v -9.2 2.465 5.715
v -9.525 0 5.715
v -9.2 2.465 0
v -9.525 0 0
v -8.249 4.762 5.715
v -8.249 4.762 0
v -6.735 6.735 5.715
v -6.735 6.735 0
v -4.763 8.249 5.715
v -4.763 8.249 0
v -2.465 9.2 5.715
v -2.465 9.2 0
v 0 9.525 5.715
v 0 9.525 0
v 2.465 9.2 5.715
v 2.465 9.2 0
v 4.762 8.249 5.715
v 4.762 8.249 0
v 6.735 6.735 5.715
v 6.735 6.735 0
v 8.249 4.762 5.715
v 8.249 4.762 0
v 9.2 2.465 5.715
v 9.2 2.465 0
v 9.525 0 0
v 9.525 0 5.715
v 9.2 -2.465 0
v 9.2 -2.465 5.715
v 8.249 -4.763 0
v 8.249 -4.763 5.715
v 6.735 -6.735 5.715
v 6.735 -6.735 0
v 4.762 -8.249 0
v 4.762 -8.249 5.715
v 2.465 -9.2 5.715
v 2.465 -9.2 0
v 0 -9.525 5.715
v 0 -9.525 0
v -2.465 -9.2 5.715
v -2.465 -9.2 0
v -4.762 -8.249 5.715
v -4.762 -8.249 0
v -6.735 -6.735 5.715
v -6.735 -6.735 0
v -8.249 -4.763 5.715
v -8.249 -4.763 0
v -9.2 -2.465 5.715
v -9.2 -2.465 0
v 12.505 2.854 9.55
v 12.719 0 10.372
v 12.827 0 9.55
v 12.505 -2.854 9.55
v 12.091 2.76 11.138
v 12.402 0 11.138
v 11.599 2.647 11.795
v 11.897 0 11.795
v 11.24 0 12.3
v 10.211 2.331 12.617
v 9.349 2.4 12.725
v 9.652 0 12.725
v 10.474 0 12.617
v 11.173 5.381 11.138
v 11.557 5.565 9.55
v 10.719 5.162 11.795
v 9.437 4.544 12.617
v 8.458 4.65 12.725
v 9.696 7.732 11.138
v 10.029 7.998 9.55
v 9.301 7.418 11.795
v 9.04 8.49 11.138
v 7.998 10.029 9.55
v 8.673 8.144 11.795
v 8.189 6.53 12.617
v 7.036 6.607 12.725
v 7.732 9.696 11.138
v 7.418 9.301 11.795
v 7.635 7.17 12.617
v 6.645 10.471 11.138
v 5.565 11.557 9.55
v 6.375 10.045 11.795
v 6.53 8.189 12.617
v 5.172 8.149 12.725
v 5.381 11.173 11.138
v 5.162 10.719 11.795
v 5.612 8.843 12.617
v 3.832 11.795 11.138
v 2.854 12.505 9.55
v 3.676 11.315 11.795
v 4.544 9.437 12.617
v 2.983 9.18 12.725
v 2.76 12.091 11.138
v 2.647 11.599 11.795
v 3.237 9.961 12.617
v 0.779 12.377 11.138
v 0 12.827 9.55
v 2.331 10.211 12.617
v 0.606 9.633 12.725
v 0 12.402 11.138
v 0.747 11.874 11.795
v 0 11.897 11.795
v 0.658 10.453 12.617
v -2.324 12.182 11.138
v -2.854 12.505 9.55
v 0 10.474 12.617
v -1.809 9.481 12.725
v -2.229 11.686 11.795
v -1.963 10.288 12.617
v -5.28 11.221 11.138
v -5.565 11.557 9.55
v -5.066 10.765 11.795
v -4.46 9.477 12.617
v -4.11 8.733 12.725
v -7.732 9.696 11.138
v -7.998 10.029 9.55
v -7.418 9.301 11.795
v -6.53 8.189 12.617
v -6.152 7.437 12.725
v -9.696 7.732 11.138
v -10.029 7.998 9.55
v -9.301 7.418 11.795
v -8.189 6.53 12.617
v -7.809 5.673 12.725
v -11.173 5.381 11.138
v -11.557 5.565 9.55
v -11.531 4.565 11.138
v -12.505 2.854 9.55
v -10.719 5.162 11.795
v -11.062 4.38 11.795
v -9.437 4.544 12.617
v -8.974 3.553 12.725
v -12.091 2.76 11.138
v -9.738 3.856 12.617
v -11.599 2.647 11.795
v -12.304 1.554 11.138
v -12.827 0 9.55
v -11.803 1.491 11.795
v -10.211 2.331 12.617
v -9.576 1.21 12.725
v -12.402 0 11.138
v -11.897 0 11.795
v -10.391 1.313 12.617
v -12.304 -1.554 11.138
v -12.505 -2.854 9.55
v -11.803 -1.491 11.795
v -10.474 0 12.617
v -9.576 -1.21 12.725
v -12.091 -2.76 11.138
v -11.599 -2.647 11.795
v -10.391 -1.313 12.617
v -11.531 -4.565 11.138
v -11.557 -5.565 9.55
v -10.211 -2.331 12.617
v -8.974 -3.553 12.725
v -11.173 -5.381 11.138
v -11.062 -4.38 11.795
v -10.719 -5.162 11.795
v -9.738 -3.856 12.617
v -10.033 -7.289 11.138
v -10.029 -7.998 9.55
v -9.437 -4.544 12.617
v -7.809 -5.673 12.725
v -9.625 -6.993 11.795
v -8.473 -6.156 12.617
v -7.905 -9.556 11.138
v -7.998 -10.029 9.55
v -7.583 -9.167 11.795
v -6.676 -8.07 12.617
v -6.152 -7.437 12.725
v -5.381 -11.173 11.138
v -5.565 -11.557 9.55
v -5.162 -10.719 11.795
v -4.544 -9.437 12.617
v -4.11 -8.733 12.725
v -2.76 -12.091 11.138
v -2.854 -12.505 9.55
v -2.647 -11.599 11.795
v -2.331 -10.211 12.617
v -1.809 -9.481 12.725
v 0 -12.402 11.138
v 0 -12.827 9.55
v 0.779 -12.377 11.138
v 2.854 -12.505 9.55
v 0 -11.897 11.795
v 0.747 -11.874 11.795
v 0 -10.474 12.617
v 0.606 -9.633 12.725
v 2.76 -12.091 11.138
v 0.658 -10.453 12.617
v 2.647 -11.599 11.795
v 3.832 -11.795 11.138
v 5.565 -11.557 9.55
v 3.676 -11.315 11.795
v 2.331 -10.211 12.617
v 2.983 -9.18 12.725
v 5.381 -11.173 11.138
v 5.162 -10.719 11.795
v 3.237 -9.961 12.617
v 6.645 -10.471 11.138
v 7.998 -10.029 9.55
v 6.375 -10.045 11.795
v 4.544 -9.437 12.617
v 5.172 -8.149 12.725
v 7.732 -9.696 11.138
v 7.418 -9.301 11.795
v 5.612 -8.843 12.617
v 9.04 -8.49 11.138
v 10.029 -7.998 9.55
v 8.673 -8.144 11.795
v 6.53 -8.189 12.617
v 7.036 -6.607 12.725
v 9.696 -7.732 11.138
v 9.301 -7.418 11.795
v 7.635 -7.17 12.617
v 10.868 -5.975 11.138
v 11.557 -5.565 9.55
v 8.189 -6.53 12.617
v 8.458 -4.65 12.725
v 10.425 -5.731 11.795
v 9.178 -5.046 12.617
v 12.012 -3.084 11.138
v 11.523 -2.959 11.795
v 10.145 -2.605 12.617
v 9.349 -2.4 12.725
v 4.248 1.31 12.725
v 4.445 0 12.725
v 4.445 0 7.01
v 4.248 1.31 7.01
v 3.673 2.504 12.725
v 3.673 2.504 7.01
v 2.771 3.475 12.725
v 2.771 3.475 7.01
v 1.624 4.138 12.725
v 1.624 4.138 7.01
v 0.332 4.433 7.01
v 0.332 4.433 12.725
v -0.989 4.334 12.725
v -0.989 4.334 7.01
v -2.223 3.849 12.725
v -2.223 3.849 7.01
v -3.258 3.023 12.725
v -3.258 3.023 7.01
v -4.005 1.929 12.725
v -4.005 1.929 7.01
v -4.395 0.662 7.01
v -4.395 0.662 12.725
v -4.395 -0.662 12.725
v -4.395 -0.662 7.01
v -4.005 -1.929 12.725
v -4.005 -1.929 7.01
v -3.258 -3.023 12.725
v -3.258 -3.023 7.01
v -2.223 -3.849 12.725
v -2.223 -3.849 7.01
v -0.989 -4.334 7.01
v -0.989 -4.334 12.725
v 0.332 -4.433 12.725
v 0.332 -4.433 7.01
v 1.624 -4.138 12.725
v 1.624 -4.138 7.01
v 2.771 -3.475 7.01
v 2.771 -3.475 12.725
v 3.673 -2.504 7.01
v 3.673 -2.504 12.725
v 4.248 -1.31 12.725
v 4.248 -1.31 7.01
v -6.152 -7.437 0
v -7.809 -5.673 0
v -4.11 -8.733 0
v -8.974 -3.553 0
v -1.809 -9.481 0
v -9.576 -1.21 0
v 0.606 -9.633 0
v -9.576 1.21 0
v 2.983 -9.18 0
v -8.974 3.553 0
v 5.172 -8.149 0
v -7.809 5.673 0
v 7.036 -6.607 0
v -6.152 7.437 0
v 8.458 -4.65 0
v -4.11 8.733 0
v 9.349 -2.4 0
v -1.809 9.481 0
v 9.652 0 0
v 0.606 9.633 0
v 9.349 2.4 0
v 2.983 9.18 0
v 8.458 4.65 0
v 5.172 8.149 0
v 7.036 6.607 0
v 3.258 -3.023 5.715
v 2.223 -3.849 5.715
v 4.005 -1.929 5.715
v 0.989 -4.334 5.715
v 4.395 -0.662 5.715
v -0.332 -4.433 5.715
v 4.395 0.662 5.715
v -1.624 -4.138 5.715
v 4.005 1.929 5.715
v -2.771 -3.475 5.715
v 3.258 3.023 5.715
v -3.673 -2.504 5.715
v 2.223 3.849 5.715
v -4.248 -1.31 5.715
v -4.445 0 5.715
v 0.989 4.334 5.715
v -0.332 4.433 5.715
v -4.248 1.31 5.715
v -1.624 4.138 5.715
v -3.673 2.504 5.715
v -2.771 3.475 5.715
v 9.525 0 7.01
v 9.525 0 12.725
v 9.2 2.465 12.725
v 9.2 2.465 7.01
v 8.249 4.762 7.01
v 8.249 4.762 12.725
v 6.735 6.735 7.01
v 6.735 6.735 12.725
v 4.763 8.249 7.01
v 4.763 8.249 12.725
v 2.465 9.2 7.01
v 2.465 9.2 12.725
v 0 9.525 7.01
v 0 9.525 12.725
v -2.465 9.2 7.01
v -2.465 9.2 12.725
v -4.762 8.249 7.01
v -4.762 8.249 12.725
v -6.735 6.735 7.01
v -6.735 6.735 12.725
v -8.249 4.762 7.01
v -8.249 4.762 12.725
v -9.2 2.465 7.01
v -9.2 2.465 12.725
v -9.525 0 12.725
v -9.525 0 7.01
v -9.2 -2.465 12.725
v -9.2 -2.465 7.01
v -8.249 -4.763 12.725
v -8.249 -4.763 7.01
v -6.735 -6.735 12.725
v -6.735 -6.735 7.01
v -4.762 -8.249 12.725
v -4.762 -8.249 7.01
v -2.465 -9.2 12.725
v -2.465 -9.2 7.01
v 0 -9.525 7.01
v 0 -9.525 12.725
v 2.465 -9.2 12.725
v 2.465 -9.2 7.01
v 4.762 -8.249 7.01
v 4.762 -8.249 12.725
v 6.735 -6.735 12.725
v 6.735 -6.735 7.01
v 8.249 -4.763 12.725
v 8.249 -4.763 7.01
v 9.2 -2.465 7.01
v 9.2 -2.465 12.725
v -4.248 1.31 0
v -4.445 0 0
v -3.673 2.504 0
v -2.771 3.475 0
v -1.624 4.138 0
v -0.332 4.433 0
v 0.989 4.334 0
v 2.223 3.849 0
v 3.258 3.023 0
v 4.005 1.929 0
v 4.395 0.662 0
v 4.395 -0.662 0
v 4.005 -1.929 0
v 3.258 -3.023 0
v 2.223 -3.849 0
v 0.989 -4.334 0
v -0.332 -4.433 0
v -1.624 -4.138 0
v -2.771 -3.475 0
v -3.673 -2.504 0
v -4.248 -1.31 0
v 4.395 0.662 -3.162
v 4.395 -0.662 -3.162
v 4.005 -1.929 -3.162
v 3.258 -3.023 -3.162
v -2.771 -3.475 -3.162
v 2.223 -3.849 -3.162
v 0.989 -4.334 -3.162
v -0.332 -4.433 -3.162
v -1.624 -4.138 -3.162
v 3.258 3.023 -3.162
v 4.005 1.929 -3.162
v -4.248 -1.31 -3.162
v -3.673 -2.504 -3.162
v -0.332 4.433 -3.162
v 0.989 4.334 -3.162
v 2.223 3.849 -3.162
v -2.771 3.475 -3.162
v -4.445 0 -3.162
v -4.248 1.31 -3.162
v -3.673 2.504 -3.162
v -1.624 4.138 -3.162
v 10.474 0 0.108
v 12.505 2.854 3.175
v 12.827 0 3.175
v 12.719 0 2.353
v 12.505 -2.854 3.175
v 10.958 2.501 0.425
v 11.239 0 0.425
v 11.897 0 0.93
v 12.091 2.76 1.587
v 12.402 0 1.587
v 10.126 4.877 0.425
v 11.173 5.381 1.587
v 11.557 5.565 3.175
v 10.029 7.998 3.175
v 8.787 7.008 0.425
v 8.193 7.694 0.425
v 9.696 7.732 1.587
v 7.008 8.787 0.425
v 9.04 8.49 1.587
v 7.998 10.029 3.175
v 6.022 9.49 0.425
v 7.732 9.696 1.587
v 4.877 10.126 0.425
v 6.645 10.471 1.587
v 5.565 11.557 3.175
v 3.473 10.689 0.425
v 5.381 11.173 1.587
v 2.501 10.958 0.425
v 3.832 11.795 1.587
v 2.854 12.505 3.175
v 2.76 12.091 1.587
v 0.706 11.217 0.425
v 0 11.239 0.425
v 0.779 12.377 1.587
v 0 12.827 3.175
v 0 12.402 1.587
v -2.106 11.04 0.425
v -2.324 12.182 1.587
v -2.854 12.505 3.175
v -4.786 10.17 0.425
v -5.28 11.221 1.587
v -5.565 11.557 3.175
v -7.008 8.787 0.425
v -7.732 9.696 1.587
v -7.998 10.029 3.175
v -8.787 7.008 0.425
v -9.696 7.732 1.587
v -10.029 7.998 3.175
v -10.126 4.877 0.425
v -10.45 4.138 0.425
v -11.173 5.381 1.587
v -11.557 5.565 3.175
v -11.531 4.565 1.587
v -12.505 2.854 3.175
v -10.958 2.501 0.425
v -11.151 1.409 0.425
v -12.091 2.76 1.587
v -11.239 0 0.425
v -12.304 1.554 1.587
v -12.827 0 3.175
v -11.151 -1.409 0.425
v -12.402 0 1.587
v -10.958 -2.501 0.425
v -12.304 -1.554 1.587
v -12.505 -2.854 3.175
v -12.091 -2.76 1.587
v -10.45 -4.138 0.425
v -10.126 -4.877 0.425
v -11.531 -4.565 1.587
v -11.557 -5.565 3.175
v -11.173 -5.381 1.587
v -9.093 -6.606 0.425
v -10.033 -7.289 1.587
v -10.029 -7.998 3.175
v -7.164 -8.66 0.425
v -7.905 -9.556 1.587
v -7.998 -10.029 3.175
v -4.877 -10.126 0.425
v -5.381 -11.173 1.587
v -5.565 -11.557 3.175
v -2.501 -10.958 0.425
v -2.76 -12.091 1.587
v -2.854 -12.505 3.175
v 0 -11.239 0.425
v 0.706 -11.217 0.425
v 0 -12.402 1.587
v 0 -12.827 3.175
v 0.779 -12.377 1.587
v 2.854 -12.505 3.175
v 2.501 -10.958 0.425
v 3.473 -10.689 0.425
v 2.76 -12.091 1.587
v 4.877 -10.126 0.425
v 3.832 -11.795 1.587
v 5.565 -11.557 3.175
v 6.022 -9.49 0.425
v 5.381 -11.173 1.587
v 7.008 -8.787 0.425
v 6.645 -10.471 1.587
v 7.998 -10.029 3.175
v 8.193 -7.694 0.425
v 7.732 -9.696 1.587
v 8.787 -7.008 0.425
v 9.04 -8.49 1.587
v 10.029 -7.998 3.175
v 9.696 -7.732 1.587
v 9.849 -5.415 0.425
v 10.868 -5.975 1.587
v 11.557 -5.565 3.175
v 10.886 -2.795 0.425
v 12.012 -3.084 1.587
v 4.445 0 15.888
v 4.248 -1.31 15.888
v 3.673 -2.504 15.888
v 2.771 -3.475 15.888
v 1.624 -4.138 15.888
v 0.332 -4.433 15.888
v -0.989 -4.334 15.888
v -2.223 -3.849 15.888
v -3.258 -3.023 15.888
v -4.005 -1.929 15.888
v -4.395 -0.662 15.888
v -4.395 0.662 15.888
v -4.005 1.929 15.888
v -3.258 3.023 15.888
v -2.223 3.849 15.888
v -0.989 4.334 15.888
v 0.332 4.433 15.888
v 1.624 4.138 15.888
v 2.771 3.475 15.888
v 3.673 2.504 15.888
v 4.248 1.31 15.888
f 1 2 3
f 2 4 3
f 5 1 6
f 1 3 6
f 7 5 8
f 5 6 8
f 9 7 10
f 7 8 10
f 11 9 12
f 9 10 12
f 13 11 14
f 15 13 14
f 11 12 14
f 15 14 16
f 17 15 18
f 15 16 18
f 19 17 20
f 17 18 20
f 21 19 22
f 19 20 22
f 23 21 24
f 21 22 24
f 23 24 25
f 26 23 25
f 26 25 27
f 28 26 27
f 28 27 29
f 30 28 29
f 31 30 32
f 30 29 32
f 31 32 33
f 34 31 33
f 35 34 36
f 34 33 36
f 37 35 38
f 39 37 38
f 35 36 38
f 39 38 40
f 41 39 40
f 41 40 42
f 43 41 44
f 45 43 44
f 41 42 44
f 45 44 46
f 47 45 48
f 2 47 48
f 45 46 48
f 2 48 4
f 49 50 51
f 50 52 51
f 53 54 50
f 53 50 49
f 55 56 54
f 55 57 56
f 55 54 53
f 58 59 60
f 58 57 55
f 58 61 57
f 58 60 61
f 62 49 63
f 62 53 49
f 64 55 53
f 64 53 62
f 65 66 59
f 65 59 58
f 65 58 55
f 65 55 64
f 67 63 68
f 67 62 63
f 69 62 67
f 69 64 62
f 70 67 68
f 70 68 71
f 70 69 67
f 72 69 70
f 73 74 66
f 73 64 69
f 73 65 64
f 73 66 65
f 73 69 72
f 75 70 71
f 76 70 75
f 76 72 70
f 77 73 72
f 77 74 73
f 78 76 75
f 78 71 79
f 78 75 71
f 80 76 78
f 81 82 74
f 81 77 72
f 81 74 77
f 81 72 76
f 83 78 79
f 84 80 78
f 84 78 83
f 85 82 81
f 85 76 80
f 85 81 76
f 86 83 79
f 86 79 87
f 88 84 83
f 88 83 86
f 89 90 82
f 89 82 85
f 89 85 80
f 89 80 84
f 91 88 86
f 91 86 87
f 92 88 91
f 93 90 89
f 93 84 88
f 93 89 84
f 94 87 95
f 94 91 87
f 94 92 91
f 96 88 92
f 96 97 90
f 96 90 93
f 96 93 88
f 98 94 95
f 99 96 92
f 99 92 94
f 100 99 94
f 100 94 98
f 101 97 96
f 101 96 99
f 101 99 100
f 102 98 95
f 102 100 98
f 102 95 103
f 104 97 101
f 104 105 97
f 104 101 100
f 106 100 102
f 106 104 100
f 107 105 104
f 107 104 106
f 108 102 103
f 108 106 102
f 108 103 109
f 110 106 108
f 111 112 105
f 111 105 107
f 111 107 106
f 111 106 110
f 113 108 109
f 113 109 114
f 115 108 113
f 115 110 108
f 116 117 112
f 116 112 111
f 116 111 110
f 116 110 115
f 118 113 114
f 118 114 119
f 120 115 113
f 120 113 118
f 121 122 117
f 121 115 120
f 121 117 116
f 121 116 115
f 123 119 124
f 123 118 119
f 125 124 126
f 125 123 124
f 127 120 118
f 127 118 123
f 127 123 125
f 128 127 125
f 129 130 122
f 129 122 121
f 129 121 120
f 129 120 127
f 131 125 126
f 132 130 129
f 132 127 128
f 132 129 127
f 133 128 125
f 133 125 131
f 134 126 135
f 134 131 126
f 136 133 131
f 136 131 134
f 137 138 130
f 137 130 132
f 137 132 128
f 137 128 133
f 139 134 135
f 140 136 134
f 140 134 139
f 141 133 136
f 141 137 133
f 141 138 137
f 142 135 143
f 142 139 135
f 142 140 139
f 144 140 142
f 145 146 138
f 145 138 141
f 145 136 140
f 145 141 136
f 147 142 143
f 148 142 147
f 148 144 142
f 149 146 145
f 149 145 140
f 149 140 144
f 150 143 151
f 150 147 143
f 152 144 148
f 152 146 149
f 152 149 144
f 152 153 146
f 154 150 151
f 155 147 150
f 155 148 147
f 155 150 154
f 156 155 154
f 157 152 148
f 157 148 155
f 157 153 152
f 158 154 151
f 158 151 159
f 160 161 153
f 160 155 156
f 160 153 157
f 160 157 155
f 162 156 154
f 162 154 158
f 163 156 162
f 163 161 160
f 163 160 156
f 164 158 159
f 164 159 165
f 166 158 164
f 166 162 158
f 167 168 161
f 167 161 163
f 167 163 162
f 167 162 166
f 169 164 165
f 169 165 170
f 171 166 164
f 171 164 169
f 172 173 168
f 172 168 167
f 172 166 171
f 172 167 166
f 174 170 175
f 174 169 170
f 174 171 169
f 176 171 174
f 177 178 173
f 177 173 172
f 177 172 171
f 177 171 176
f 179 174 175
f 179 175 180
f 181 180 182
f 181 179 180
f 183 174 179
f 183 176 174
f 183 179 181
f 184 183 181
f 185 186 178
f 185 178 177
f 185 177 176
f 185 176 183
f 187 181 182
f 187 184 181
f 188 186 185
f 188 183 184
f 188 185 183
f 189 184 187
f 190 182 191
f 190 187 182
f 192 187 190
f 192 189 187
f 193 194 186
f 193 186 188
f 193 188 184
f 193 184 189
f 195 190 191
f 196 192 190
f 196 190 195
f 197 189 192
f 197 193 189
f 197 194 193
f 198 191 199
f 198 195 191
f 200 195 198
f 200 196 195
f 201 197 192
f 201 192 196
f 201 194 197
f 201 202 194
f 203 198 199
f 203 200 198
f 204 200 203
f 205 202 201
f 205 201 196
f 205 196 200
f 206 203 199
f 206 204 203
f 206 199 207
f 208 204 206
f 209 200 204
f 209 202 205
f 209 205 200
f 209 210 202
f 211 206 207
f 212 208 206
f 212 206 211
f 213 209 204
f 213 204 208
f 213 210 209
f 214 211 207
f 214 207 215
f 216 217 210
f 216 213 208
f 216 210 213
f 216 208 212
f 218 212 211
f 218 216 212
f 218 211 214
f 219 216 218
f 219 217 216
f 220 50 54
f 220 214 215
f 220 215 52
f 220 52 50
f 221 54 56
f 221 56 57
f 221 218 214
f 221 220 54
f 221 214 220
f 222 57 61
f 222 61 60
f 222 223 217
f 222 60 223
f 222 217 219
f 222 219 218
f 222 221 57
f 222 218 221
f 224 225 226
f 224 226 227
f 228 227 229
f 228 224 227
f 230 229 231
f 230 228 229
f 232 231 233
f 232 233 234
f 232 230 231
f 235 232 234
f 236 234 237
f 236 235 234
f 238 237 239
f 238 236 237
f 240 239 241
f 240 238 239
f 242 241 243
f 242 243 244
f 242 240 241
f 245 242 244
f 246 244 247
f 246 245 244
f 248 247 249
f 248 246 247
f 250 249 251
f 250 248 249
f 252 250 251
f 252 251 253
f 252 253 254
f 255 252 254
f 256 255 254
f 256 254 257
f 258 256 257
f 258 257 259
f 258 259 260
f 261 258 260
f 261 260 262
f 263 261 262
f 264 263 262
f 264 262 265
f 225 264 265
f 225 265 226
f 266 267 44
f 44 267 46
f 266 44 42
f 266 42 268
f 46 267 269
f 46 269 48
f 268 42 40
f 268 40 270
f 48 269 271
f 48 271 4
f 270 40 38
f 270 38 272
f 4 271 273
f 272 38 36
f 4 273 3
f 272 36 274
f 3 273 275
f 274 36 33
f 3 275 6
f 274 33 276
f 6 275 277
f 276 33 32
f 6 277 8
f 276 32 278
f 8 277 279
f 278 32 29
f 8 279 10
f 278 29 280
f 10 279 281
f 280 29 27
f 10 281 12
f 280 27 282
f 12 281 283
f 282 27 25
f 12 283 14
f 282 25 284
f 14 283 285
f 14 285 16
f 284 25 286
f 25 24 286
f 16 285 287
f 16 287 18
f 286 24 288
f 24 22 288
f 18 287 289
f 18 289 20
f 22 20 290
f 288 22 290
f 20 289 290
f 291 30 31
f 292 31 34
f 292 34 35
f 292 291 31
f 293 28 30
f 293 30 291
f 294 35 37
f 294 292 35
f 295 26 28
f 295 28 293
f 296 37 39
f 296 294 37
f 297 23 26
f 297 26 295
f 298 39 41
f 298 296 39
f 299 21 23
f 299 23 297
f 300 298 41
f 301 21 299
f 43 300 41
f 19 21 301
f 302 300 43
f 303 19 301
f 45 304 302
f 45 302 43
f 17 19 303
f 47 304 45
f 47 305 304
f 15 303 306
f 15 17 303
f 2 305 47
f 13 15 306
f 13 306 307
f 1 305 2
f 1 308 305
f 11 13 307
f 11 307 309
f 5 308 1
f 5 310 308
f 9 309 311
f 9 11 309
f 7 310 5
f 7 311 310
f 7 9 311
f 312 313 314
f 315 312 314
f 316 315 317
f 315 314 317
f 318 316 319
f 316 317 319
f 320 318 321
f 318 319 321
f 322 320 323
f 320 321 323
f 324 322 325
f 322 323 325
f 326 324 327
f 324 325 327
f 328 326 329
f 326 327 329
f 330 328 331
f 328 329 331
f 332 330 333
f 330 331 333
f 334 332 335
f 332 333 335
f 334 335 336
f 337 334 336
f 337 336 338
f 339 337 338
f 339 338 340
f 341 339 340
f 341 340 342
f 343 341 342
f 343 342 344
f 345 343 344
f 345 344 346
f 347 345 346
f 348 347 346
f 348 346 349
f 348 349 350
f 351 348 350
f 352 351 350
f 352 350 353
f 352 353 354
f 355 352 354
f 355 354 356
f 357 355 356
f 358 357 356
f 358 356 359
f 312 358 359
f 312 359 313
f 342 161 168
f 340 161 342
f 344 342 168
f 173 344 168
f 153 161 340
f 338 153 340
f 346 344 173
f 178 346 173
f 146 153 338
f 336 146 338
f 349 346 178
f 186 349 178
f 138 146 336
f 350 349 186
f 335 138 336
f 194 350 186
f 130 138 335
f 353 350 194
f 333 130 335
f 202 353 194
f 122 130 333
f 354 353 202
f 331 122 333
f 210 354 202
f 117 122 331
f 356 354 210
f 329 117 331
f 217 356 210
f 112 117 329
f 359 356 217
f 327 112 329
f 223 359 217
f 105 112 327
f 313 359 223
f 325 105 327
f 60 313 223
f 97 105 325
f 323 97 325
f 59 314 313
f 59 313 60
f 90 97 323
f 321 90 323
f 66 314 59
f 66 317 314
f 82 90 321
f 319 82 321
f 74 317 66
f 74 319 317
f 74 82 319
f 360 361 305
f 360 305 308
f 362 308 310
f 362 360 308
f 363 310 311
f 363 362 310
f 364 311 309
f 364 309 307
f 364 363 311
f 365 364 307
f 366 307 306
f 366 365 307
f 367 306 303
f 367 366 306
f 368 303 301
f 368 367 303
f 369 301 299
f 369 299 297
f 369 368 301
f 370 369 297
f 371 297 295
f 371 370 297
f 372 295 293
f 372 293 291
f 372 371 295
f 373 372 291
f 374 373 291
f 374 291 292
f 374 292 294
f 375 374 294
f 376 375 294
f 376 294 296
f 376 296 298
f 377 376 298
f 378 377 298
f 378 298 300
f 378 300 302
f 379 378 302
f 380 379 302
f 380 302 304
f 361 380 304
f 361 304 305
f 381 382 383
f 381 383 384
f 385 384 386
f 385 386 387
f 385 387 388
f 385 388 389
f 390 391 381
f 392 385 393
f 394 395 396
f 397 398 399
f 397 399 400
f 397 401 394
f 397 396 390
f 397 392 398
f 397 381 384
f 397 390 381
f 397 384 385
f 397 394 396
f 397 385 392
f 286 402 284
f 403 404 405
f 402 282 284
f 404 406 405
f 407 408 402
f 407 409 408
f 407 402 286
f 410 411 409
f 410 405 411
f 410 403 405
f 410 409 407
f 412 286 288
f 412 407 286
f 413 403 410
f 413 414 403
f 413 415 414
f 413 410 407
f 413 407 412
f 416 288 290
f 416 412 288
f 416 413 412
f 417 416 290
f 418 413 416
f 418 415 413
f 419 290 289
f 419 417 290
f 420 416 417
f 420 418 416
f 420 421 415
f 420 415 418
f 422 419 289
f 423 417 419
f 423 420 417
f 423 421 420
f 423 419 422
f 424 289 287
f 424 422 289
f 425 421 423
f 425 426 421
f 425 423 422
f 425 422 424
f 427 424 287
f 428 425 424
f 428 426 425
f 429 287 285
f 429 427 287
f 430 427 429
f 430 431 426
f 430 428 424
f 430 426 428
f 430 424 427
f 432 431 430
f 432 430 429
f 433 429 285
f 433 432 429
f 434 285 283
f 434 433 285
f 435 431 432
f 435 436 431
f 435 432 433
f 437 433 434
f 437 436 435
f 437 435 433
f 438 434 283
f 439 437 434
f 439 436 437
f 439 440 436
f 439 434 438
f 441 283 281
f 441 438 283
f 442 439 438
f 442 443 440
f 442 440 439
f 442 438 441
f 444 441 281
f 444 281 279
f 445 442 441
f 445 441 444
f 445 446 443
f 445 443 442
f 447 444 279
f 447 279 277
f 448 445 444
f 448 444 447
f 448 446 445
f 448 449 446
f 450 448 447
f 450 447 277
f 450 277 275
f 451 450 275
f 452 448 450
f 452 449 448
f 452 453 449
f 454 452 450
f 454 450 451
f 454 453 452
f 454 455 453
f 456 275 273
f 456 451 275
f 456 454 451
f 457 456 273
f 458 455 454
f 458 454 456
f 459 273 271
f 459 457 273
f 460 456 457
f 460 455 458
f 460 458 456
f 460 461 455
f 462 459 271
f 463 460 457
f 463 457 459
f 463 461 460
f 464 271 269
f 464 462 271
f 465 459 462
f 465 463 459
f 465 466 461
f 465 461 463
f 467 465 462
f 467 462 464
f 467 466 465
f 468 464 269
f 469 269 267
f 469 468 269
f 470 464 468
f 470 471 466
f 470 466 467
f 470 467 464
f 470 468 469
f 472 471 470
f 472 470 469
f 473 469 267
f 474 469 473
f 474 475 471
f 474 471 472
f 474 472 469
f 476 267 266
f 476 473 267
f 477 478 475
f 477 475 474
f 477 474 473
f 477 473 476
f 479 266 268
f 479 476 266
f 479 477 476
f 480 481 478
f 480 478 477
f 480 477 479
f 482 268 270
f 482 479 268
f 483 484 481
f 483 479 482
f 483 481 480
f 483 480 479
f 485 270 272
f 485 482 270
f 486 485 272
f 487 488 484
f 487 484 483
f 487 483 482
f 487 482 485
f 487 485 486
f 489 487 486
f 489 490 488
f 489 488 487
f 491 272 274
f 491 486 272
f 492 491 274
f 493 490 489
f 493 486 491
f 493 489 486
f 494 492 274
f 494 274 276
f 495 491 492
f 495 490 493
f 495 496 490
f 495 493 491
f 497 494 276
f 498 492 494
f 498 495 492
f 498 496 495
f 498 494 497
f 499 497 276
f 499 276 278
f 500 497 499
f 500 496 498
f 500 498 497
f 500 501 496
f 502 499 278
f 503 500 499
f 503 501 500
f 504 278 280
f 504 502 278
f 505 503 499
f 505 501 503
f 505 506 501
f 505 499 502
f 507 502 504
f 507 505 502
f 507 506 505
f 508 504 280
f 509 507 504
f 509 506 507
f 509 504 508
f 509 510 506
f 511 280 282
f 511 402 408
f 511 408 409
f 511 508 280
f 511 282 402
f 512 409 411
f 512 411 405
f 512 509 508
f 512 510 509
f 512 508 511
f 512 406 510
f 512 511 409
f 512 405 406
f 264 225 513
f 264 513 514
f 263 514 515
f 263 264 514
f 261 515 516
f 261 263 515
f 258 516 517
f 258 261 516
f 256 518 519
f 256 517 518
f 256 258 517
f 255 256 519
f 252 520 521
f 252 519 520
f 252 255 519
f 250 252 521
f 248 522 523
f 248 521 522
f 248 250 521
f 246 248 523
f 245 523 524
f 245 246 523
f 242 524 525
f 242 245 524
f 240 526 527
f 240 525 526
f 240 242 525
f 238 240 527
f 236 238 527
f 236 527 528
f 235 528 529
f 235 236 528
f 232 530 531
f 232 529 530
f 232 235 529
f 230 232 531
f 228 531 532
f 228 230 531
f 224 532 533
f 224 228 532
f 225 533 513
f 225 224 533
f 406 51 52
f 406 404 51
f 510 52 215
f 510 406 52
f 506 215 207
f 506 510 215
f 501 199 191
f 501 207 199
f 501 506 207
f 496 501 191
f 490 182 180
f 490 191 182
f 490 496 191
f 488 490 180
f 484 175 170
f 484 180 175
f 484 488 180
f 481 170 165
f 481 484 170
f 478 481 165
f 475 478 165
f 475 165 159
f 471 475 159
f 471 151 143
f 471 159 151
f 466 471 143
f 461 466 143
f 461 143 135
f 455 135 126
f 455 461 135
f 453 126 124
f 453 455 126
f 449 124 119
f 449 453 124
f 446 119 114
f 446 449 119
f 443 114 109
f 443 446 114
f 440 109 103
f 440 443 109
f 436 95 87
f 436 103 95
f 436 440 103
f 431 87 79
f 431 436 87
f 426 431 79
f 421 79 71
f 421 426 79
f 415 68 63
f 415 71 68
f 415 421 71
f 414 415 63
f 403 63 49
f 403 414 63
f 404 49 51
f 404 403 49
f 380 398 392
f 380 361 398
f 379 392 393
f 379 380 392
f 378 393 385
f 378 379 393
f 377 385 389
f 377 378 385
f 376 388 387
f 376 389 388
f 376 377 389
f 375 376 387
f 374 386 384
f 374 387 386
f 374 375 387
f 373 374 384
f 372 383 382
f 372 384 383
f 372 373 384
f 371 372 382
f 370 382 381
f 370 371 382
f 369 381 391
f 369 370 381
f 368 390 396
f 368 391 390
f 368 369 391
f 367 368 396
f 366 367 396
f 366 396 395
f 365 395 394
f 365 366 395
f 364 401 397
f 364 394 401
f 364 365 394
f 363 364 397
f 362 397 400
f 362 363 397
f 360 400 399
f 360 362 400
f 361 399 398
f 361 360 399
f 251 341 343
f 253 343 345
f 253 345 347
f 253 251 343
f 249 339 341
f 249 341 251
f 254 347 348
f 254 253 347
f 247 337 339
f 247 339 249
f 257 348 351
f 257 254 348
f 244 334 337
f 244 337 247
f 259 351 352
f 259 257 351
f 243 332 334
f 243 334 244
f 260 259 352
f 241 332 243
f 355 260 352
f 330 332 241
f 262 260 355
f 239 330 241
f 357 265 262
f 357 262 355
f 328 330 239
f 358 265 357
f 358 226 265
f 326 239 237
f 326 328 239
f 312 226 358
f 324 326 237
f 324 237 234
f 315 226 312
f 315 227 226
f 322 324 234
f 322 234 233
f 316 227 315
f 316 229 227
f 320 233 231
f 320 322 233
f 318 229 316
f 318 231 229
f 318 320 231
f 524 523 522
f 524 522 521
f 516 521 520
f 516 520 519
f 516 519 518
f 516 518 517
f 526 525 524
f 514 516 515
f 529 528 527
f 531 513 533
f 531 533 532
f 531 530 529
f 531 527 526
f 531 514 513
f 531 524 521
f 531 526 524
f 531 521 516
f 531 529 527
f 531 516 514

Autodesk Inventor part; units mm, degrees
ref_plane "YZ Plane" through (0, 0, 0) normal (1, 0, 0) x (0, 1, 0)
ref_plane "XZ Plane" through (0, 0, 0) normal (0, 1, 0) x (-1, 0, 0)
ref_plane "XY Plane" through (0, 0, 0) normal (0, 0, 1) x (1, 0, 0)
sketch "Sketch1" plane through (0, 0, 0) normal (0, 0, 1) x (1, 0, 0)
  circle A0 centre (0, 0) radius 12.827
  dimension "d0" = 25.654
extrude "Extrusion1" add sketch "Sketch1" along normal blind 12.7254
sketch "Sketch2" plane through (0, 0, 12.7254) normal (0, 0, 1) x (1, 0, 0)
  circle A0 centre (0, 0) radius 9.525
  circle A1 centre (0, 0) radius 4.445
  dimension "d3" = 19.05
  dimension "d4" = 8.89
extrude "Extrusion2" cut sketch "Sketch2" against normal blind 5.715
sketch "Sketch3" plane through (0, 0, 0) normal (0, 0, -1) x (-1, 0, 0)
  circle A0 centre (0, 0) radius 4.445
  circle A1 centre (0, 0) radius 9.525
extrude "Extrusion3" cut sketch "Sketch3" against normal blind 5.715
sketch "Sketch4" plane through (0, 0, 12.7254) normal (0, 0, 1) x (1, 0, 0)
  circle A0 centre (0, 0) radius 4.445
extrude "Extrusion4" add sketch "Sketch4" along normal blind 3.1623
sketch "Sketch5" plane through (0, 0, 0) normal (0, 0, -1) x (-1, 0, 0)
  circle A0 centre (0, 0) radius 4.445
extrude "Extrusion5" add sketch "Sketch5" along normal blind 3.1623
fillet "Fillet1" radius 3.175 2 edges at (-12.827, 0, 12.7254) (-12.827, 0, 0)
properties part number "CastorWheel" material "ABS Plastic"
